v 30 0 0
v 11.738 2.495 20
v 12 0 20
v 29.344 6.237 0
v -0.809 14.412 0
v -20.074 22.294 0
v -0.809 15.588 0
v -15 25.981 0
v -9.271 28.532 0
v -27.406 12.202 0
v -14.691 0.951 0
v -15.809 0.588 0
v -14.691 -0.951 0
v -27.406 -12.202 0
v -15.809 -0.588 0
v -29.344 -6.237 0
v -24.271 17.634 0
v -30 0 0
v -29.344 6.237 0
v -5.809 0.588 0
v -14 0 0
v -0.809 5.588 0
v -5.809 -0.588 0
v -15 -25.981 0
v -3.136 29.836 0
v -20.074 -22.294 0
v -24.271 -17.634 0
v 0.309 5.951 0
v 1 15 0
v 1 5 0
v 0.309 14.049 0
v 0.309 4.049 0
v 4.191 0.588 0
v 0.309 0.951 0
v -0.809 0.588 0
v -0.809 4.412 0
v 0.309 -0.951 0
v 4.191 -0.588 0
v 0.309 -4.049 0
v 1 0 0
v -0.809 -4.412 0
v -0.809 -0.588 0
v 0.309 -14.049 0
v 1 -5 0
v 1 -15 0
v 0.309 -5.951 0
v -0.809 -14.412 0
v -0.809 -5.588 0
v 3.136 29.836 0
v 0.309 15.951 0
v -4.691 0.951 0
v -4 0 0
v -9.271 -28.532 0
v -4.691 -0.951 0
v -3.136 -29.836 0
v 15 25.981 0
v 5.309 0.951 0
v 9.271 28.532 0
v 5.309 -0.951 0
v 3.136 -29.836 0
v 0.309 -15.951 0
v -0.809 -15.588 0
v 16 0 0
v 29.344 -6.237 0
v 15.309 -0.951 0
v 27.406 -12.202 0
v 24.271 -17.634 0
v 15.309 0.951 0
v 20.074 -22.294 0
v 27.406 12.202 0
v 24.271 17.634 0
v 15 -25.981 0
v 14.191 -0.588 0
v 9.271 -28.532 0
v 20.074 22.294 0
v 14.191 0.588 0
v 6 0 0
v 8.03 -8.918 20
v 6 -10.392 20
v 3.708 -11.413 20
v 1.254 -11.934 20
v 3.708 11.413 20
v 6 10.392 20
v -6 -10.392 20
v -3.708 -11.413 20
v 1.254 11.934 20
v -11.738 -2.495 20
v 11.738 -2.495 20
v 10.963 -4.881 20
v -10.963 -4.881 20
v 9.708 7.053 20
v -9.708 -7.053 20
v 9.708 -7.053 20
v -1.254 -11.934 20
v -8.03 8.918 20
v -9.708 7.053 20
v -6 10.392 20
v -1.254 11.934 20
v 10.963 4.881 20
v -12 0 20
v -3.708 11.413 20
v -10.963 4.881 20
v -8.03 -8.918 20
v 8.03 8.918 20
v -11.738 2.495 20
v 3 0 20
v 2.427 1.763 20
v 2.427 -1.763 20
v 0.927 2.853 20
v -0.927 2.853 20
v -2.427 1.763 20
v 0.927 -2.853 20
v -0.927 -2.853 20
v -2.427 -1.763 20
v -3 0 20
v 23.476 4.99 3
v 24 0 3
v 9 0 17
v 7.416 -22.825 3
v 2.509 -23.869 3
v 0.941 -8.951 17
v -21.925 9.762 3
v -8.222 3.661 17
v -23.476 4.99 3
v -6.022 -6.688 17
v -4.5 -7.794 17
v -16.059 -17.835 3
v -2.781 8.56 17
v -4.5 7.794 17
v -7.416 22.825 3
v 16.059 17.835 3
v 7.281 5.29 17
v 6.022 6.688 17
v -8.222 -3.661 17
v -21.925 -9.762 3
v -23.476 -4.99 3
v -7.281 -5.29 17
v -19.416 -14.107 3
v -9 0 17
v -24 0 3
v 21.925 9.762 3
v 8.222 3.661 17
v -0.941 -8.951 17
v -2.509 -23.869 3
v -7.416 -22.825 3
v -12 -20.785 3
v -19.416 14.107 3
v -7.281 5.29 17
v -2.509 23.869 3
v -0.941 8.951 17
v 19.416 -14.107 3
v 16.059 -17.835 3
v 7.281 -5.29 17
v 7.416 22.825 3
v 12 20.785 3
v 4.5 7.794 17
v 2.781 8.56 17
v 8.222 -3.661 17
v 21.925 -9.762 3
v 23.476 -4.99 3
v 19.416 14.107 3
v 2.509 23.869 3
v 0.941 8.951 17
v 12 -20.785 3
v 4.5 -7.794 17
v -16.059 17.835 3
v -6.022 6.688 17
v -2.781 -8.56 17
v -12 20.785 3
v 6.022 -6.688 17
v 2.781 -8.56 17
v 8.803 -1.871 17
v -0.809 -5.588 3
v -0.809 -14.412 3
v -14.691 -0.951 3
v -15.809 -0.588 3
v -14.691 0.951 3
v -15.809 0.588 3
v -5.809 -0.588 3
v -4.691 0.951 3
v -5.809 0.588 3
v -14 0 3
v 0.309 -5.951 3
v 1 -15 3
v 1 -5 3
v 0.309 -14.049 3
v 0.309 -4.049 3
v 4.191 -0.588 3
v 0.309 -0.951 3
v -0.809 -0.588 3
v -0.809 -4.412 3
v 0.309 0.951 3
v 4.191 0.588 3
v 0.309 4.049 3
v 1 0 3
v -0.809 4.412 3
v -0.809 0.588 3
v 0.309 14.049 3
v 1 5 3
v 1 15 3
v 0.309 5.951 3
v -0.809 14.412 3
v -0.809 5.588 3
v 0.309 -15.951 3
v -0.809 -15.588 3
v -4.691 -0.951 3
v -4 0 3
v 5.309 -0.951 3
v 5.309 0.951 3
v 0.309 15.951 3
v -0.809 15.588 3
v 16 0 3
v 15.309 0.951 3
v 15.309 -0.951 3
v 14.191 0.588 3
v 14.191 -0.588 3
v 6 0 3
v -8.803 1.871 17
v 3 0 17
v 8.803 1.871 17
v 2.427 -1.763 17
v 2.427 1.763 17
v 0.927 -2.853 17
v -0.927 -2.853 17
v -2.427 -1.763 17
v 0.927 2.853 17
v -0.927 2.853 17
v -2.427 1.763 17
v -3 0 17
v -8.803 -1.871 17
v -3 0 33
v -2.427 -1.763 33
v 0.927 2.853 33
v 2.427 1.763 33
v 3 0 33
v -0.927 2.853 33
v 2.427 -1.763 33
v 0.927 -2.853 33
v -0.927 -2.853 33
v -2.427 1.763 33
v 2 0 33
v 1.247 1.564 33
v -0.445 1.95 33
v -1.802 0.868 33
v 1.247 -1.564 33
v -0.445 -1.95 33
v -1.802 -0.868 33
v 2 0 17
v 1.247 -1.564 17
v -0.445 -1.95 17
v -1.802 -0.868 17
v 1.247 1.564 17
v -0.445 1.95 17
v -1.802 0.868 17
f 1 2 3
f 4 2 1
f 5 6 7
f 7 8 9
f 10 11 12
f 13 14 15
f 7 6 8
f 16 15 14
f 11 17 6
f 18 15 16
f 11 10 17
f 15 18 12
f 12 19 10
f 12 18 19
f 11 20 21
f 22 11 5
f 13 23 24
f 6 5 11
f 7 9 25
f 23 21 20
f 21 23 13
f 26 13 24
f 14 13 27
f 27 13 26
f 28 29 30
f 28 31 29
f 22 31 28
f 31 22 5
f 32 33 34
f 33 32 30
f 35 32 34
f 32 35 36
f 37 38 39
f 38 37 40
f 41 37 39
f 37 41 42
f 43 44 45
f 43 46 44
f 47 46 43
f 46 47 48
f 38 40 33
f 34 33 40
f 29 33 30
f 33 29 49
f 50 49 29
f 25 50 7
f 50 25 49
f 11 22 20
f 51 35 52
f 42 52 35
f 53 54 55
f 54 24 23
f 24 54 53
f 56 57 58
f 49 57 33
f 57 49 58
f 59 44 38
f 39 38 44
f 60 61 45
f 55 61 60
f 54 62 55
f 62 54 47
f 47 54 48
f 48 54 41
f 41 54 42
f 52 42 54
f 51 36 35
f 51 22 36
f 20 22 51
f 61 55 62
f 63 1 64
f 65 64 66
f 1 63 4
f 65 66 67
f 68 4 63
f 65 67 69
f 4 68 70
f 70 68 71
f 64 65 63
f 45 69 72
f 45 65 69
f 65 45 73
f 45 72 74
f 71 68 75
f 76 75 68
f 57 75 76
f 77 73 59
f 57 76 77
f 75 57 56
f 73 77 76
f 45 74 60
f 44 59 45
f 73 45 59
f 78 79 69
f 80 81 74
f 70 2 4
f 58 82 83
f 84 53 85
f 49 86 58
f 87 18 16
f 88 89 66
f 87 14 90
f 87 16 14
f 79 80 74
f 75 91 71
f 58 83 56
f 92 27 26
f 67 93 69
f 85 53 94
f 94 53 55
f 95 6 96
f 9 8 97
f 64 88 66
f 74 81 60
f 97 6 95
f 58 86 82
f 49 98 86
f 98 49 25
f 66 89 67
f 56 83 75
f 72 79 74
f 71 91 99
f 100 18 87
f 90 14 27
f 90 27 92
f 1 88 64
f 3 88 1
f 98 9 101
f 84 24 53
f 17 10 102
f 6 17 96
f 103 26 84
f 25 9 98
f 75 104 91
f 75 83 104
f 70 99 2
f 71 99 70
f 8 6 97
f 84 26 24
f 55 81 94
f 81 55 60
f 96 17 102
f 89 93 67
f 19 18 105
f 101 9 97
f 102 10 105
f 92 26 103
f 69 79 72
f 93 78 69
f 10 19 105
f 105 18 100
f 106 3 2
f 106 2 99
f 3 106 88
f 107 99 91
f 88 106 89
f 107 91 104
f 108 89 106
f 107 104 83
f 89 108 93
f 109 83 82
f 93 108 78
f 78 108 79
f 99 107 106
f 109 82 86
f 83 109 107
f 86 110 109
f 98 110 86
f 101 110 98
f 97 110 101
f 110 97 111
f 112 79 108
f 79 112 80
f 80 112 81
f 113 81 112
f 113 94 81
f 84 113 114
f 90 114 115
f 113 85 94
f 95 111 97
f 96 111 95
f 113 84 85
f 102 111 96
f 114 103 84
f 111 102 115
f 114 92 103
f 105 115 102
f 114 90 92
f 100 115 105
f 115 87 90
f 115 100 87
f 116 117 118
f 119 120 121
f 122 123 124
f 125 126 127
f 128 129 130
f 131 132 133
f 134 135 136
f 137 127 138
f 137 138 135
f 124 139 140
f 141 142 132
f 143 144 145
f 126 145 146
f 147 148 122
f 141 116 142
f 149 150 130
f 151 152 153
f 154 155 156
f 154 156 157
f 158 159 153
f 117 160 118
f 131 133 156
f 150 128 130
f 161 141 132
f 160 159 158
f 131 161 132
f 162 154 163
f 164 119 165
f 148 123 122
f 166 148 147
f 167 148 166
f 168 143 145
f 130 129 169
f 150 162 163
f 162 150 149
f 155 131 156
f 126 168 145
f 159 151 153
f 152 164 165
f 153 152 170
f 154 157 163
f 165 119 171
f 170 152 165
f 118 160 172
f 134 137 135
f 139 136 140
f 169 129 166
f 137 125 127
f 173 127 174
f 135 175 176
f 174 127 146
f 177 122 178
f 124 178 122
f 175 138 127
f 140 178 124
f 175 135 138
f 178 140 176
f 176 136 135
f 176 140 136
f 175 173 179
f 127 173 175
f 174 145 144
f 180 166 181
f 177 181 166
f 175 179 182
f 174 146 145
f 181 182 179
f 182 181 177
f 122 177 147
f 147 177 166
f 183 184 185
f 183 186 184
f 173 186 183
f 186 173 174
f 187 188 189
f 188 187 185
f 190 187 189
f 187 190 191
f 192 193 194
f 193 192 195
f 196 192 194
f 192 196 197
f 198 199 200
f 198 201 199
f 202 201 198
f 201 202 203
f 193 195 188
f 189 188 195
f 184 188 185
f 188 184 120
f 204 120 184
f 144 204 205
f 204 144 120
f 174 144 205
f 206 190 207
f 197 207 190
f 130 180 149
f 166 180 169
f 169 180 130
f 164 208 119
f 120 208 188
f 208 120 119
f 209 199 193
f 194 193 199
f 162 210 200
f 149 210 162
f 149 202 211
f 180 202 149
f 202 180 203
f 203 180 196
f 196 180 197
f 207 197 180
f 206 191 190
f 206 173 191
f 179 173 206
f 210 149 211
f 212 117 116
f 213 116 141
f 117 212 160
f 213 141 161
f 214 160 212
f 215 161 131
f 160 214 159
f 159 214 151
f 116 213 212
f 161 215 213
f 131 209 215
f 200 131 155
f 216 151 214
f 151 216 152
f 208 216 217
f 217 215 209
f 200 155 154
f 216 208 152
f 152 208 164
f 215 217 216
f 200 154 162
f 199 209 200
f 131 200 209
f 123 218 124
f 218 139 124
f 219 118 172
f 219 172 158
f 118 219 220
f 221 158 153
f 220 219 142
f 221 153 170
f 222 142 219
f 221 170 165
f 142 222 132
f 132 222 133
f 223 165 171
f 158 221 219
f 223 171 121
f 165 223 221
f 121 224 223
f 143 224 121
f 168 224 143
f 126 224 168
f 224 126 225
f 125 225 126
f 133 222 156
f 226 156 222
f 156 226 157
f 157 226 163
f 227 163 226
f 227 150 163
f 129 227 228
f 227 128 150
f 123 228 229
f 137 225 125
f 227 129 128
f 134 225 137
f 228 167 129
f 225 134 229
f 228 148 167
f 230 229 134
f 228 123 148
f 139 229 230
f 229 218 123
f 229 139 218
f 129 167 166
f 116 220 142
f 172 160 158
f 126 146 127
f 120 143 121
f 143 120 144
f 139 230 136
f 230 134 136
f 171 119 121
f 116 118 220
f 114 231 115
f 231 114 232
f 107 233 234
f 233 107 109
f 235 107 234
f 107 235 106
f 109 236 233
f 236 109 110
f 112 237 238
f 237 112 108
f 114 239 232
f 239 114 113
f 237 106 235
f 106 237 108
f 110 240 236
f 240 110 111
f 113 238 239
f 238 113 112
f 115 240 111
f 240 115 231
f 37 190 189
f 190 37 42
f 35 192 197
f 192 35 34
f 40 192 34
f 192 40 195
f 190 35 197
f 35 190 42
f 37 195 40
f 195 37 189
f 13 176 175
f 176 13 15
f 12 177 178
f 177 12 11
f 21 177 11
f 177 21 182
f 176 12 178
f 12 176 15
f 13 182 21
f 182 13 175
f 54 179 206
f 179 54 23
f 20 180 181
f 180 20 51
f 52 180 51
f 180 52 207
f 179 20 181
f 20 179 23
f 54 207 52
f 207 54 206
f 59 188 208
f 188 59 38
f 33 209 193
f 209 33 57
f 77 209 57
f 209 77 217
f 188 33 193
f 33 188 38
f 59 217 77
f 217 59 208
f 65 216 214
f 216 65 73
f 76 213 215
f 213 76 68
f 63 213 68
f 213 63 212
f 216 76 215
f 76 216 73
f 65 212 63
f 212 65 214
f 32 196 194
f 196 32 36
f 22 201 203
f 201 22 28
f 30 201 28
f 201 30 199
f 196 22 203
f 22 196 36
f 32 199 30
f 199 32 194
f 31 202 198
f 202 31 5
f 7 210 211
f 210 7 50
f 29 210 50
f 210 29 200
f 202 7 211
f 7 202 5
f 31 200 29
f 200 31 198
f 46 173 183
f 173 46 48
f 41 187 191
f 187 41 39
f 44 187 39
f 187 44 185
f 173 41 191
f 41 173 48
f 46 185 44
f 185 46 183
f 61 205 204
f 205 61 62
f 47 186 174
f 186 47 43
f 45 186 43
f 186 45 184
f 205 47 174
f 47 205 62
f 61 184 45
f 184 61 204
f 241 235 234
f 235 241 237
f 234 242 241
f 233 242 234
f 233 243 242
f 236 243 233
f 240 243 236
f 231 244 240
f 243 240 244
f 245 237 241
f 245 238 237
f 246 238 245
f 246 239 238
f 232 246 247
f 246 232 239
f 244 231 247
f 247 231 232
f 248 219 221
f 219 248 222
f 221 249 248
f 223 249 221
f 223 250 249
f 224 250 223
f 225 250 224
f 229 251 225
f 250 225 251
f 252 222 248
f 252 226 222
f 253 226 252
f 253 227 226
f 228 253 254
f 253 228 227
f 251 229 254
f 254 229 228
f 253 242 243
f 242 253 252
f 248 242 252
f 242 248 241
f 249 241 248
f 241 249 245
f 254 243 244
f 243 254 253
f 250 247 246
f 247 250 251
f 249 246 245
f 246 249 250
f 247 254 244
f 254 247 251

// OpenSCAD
// Parameters
hole_radius = 1;
thickness = 3;
hole_depth = thickness+2;
cylinder1_radius1 = 30;
cylinder1_radius2 = 12;
cylinder1_height = 20;
cylinder2_radius1 = cylinder1_radius1-thickness*2;
cylinder2_radius2 = cylinder1_radius2-thickness;
cylinder2_height = cylinder1_height-thickness*2;
handle_radius = 3;
handle_height = 10;
union(){
    //cylinder
    difference() {
        cylinder( r1 = cylinder1_radius1, r2 = cylinder1_radius2, h = cylinder1_height);
        translate([0,0,thickness])
        cylinder( r1 = cylinder2_radius1, r2 = cylinder2_radius2, h = cylinder2_height);
        
        //hole for handle
        translate([0, 0, cylinder1_height-hole_depth-1])
            cylinder(h = hole_depth+handle_height+1, r = handle_radius);
        
        //holes
        translate([0,0,-1])
            cylinder(r = hole_radius, h = hole_depth);
        
        translate([-15,0,-1])
            cylinder(r = hole_radius, h = hole_depth);
        translate([-5,0,-1])
            cylinder(r = hole_radius, h = hole_depth);
        translate([5,0,-1])
            cylinder(r = hole_radius, h = hole_depth);
        translate([15,0,-1])
            cylinder(r = hole_radius, h = hole_depth);
        
        translate([0,5,-1])
            cylinder(r = hole_radius, h = hole_depth);
        translate([0,15,-1])
            cylinder(r = hole_radius, h = hole_depth);
        translate([0,-5,-1])
            cylinder(r = hole_radius, h = hole_depth);
        translate([0,-15,-1])
            cylinder(r = hole_radius, h = hole_depth);
        }
    //handle
    difference() {
        translate([0, 0, cylinder2_height+thickness])
            cylinder(h = handle_height+thickness+3, r = handle_radius);
        translate([0, 0, cylinder2_height+thickness-1])
            cylinder(h = handle_height+thickness+5, r = handle_radius-1);
    }
}
